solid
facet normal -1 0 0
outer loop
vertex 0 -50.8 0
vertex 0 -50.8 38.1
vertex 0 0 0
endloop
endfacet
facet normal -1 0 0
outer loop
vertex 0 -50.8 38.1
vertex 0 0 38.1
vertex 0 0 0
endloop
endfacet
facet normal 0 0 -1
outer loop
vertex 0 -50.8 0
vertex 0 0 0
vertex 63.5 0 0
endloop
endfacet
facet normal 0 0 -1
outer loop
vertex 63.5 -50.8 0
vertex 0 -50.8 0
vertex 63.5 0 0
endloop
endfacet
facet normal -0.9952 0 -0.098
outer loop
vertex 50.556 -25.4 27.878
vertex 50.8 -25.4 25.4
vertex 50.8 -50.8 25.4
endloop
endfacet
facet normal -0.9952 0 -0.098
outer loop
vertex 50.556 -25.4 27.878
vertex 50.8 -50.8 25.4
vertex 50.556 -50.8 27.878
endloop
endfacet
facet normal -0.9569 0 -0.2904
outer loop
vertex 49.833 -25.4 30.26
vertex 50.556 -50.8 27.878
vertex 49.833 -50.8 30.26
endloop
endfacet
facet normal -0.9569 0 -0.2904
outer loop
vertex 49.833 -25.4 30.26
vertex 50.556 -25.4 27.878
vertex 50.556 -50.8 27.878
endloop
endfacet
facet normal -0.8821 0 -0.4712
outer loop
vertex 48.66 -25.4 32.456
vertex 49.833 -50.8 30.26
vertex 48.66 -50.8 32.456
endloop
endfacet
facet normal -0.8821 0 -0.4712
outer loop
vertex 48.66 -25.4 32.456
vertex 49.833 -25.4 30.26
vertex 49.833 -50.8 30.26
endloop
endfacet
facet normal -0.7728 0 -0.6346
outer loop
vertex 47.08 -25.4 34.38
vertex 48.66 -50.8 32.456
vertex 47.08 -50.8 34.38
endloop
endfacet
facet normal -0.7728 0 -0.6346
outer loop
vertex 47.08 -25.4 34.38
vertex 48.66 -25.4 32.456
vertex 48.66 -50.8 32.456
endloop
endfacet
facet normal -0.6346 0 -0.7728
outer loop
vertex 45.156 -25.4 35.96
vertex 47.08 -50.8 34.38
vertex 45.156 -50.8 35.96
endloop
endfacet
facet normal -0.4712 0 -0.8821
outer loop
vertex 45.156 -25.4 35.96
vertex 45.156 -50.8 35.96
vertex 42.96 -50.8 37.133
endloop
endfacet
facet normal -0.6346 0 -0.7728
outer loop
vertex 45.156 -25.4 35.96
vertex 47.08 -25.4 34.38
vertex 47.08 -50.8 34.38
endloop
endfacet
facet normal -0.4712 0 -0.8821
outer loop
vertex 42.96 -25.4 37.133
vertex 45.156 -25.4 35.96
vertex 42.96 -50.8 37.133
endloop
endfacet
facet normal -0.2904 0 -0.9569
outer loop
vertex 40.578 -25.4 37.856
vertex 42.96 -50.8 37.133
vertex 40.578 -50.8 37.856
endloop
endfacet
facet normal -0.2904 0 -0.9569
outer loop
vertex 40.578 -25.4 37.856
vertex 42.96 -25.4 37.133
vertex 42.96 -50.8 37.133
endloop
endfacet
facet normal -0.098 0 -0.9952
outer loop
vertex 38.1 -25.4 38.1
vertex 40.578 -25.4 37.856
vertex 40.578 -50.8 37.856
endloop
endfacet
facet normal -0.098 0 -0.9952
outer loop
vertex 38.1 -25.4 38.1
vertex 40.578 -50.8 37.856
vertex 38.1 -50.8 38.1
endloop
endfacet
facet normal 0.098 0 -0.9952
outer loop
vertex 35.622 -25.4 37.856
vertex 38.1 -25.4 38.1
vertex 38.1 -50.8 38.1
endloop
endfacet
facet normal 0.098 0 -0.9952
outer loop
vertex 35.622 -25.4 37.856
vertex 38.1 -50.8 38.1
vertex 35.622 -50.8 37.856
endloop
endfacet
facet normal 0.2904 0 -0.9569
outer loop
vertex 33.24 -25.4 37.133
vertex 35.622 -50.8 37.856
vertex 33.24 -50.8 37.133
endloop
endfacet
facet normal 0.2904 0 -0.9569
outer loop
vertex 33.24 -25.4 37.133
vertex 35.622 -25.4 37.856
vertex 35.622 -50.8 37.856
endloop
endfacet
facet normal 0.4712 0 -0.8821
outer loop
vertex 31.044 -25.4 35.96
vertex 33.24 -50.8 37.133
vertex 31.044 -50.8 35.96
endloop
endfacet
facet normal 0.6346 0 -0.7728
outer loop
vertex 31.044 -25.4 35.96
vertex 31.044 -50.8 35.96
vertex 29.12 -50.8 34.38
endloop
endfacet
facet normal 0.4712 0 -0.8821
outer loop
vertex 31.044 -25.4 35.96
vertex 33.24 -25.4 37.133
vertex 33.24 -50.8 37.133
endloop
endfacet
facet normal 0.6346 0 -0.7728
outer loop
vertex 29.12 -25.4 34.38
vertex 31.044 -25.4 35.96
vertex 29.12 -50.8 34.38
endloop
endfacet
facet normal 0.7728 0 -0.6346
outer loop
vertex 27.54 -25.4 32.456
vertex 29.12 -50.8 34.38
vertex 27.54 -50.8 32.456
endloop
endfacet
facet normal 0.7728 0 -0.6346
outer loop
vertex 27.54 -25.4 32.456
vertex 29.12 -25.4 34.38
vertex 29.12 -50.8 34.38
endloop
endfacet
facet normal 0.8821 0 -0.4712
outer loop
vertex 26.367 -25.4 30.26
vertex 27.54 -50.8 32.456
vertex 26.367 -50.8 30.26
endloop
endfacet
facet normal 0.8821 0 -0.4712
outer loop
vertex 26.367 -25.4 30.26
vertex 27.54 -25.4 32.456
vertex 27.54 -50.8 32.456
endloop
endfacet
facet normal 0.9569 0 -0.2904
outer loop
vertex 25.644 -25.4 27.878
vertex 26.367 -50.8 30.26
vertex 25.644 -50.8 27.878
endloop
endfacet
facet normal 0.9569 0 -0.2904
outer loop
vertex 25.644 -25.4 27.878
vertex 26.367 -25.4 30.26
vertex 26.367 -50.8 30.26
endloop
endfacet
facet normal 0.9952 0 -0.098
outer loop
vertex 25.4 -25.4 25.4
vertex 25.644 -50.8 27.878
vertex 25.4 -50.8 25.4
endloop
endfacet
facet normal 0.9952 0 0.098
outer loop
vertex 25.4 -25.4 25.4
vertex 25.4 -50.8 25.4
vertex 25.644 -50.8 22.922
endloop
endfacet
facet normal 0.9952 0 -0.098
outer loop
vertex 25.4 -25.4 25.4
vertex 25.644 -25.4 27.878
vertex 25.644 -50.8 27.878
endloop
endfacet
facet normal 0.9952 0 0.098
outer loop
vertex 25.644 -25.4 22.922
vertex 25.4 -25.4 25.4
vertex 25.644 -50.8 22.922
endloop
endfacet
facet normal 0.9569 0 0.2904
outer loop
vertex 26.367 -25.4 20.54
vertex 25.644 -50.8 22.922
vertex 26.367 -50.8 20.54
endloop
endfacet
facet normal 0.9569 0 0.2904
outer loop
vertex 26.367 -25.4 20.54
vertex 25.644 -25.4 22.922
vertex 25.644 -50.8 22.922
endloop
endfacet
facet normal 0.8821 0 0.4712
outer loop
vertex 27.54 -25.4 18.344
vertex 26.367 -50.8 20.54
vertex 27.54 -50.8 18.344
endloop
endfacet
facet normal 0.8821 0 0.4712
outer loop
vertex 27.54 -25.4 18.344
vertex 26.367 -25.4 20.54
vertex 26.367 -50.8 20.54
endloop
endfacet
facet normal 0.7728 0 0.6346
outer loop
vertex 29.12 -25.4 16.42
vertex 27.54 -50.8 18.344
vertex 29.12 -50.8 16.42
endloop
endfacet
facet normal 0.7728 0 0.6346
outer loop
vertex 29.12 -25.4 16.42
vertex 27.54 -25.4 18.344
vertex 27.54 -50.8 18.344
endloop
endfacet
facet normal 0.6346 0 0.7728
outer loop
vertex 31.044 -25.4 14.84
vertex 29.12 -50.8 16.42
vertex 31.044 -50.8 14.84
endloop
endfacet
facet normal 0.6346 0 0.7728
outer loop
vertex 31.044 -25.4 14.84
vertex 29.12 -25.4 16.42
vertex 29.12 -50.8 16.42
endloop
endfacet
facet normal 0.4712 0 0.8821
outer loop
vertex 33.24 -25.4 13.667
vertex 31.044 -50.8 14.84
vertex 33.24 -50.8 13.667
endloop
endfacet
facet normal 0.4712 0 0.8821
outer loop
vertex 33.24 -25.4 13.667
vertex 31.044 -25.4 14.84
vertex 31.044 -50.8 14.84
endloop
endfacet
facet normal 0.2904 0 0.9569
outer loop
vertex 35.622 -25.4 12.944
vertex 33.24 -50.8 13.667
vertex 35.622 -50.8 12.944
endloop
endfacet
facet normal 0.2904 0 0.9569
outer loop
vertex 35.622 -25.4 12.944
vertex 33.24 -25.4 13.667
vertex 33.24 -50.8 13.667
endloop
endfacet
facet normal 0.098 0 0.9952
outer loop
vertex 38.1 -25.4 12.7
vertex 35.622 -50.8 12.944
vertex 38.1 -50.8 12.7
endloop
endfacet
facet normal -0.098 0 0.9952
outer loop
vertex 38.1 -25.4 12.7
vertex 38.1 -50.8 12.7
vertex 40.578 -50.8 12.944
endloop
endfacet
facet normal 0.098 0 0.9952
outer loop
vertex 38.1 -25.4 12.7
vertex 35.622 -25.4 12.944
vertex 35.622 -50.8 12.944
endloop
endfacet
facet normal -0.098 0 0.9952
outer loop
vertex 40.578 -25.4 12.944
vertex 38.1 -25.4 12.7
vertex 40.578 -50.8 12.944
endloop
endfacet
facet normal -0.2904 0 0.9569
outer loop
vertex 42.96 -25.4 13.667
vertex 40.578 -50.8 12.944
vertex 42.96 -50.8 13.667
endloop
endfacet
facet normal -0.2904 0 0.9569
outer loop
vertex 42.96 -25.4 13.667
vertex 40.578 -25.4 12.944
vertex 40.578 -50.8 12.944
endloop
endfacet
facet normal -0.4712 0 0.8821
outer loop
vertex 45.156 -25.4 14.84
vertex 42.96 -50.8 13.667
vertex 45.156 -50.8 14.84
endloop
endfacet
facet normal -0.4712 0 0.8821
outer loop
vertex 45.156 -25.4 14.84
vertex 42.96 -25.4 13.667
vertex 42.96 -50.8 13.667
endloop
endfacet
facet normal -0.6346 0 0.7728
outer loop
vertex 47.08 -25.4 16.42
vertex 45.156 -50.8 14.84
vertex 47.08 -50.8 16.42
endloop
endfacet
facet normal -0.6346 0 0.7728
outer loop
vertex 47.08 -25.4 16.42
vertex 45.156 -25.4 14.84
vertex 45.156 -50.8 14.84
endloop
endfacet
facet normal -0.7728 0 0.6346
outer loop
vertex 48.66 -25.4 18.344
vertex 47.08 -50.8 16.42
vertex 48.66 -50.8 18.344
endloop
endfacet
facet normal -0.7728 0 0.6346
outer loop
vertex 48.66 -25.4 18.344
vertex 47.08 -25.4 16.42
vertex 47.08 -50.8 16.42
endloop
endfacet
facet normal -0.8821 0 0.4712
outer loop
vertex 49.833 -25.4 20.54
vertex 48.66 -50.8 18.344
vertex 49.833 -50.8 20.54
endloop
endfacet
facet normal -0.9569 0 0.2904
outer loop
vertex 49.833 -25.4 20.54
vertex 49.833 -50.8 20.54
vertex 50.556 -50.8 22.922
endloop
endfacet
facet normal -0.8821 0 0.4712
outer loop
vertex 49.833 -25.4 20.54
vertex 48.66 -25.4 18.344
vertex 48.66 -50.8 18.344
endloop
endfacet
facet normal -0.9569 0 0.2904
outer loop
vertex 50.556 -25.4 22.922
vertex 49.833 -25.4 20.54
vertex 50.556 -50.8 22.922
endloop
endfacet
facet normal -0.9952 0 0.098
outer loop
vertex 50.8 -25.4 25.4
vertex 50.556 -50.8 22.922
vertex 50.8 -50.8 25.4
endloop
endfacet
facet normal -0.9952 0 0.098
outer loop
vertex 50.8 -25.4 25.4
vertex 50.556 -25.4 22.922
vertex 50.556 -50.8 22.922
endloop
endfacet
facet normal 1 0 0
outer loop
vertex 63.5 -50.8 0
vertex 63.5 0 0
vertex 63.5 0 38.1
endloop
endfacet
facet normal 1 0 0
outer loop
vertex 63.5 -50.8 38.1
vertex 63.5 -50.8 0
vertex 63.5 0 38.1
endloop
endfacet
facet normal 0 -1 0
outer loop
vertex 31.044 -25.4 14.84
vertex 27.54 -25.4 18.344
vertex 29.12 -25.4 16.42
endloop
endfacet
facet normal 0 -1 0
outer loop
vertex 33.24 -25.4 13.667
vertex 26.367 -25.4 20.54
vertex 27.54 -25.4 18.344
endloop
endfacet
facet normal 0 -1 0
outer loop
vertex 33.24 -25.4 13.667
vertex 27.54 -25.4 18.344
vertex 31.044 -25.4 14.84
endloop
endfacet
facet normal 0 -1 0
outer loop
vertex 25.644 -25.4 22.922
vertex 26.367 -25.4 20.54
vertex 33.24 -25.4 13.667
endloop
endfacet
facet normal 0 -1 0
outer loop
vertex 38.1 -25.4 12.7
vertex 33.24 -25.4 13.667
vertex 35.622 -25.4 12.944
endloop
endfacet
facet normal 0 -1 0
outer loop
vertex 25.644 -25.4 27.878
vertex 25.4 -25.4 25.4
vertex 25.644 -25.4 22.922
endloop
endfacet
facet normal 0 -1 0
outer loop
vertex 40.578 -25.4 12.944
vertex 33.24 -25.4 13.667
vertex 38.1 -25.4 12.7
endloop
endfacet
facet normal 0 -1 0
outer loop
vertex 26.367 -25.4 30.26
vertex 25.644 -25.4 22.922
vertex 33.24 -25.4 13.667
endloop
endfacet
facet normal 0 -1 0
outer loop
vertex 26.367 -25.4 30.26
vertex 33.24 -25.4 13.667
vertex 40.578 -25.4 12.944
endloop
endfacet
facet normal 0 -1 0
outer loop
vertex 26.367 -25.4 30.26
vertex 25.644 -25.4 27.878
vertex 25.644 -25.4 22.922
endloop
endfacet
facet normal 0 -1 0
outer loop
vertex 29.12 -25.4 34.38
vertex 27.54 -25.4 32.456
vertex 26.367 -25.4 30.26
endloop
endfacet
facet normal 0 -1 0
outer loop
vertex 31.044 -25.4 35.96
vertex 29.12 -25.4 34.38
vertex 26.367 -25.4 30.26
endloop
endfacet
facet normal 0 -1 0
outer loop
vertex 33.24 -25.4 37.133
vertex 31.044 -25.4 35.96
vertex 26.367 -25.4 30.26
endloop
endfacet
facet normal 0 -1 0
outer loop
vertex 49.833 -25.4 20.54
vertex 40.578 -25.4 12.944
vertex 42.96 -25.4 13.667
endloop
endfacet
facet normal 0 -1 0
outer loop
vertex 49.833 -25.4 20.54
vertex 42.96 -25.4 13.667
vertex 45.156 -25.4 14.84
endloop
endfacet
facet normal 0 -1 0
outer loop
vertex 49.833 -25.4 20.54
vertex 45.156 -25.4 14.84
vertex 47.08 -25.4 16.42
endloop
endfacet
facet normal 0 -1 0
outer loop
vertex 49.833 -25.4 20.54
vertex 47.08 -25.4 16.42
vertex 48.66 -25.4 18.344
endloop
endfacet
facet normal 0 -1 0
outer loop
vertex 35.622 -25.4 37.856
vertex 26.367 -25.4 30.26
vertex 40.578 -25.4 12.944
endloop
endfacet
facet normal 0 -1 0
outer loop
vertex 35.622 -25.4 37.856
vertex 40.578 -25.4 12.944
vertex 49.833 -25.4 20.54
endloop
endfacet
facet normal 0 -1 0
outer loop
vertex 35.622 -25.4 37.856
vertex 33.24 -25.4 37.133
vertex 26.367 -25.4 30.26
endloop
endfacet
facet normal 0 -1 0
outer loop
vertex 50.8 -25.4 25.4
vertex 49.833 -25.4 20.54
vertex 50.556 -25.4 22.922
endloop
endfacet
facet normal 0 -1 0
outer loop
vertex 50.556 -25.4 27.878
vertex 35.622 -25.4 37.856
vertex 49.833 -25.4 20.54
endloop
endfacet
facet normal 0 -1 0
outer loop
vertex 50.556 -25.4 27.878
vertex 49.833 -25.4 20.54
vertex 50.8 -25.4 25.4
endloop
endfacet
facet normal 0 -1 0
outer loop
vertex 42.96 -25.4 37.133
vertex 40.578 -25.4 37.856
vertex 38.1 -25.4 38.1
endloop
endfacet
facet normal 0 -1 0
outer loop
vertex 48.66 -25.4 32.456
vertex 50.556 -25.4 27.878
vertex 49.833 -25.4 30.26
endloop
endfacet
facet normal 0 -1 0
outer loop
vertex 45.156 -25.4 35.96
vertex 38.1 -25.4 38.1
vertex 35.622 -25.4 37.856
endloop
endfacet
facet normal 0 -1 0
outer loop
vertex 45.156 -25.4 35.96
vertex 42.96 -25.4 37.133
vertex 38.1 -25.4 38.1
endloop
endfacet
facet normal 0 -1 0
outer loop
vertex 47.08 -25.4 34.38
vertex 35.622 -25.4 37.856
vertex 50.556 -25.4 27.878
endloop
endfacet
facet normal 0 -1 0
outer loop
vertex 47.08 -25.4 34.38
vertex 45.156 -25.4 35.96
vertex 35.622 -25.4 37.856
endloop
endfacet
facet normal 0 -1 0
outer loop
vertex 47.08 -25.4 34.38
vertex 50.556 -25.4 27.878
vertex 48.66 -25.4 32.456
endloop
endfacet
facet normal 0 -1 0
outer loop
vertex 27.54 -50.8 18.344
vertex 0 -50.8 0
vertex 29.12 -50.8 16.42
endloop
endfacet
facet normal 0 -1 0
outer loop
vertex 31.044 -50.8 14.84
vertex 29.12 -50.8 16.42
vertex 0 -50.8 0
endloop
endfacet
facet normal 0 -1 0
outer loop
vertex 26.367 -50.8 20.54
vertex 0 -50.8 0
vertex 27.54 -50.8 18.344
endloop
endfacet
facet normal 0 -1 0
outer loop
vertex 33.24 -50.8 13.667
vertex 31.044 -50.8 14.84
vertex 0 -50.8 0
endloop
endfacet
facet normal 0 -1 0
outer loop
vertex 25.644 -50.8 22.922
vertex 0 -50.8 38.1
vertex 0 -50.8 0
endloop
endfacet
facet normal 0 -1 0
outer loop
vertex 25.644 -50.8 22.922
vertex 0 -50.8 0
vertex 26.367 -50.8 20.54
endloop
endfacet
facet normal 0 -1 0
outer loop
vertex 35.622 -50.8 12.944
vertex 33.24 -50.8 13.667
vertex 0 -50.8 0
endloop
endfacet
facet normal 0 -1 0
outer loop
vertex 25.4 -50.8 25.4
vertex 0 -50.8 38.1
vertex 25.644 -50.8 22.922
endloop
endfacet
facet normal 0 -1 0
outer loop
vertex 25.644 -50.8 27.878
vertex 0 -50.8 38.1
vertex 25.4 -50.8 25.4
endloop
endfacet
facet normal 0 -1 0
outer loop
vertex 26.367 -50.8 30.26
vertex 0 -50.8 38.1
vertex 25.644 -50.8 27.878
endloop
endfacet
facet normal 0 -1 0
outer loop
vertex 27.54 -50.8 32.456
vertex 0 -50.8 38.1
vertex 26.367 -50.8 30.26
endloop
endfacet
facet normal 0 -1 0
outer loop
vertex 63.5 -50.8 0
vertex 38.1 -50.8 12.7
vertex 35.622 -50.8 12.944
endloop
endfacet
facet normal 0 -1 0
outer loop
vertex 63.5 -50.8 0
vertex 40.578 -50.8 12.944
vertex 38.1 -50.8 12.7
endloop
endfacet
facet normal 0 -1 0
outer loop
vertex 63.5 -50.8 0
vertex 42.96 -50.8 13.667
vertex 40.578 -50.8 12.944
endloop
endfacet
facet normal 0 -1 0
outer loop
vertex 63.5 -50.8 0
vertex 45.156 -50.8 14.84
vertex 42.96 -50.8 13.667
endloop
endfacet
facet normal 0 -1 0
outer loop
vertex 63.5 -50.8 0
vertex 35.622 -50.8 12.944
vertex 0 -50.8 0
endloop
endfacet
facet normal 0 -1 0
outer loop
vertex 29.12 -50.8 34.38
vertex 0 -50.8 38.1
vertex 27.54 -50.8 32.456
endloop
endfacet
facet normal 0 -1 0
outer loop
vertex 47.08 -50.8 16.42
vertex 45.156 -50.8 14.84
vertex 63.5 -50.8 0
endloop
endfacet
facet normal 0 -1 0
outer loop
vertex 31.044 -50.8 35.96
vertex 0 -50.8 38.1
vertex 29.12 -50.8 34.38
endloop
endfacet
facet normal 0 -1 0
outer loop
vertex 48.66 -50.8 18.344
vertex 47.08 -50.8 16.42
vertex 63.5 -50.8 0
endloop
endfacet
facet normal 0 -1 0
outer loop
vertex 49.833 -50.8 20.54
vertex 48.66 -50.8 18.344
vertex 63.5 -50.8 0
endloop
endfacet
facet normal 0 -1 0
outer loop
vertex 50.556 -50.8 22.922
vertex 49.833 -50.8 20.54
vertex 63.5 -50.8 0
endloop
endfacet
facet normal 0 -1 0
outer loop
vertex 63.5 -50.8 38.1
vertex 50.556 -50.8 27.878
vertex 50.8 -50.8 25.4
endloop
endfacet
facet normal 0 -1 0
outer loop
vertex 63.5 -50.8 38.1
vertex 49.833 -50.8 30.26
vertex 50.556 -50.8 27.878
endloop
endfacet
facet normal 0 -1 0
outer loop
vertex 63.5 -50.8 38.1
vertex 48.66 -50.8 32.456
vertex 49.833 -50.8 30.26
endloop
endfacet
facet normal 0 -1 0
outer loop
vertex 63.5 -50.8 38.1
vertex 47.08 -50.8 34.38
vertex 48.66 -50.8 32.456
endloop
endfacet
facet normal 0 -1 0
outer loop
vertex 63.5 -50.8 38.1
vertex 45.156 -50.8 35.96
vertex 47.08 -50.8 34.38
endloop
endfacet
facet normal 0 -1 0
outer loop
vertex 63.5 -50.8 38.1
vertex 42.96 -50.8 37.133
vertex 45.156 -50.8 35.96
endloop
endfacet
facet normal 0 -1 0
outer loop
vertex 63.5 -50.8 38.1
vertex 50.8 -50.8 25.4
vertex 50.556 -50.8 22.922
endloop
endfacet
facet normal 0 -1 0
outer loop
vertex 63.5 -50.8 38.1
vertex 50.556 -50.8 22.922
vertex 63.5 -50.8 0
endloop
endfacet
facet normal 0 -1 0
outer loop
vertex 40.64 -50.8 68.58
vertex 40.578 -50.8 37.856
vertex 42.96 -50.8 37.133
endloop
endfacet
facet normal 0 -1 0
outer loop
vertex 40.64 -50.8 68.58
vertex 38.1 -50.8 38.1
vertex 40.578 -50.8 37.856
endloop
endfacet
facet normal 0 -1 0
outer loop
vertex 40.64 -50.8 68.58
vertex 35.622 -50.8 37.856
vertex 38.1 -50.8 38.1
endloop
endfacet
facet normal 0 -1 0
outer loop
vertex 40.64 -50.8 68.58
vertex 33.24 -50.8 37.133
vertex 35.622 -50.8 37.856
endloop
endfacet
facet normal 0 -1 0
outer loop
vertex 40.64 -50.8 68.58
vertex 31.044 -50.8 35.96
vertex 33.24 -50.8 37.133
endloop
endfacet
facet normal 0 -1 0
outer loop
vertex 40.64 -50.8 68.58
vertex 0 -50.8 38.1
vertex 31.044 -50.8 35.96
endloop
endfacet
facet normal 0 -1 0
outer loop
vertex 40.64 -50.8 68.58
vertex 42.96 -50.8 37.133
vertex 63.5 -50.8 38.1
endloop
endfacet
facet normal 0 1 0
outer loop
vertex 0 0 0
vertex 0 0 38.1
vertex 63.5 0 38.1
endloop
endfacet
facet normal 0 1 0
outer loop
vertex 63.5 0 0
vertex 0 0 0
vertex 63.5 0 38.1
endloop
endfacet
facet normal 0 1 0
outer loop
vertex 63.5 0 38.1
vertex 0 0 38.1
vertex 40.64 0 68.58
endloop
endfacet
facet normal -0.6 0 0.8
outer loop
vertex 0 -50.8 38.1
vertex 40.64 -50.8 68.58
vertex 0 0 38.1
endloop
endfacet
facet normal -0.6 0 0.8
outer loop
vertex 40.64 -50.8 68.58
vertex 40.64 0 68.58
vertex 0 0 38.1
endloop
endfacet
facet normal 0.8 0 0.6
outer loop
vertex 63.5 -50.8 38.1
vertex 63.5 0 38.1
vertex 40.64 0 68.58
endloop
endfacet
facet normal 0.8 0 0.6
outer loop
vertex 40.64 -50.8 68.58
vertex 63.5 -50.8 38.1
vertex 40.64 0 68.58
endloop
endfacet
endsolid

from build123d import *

# Parameters (mm, degrees)
F0_W     = 63.5
F0_H     = 38.1
F1_DEPTH = 25.4
F2_R     = 12.7
F3_DEPTH = 25.4


with BuildPart() as f1:
    # F0 (on Front) → F1 (new body)
    with BuildSketch(Plane.XZ):
        Polygon((40.64, 68.58), (0, 38.1), (63.5, 38.1), align=None)
        with Locations((31.75, 19.05)):
            Rectangle(F0_W, F0_H)
    extrude(amount=F1_DEPTH)

    # F2 (on face) → F3 (join)
    with BuildSketch(Plane.XZ.offset(25.4)):
        Polygon((63.5, 38.1), (40.64, 68.58), (0, 38.1), (0, 0), (63.5, 0), align=None)
        with Locations((38.1, 25.4)):
            Circle(F2_R, mode=Mode.SUBTRACT)
    extrude(amount=F3_DEPTH)


solid = f1.part
